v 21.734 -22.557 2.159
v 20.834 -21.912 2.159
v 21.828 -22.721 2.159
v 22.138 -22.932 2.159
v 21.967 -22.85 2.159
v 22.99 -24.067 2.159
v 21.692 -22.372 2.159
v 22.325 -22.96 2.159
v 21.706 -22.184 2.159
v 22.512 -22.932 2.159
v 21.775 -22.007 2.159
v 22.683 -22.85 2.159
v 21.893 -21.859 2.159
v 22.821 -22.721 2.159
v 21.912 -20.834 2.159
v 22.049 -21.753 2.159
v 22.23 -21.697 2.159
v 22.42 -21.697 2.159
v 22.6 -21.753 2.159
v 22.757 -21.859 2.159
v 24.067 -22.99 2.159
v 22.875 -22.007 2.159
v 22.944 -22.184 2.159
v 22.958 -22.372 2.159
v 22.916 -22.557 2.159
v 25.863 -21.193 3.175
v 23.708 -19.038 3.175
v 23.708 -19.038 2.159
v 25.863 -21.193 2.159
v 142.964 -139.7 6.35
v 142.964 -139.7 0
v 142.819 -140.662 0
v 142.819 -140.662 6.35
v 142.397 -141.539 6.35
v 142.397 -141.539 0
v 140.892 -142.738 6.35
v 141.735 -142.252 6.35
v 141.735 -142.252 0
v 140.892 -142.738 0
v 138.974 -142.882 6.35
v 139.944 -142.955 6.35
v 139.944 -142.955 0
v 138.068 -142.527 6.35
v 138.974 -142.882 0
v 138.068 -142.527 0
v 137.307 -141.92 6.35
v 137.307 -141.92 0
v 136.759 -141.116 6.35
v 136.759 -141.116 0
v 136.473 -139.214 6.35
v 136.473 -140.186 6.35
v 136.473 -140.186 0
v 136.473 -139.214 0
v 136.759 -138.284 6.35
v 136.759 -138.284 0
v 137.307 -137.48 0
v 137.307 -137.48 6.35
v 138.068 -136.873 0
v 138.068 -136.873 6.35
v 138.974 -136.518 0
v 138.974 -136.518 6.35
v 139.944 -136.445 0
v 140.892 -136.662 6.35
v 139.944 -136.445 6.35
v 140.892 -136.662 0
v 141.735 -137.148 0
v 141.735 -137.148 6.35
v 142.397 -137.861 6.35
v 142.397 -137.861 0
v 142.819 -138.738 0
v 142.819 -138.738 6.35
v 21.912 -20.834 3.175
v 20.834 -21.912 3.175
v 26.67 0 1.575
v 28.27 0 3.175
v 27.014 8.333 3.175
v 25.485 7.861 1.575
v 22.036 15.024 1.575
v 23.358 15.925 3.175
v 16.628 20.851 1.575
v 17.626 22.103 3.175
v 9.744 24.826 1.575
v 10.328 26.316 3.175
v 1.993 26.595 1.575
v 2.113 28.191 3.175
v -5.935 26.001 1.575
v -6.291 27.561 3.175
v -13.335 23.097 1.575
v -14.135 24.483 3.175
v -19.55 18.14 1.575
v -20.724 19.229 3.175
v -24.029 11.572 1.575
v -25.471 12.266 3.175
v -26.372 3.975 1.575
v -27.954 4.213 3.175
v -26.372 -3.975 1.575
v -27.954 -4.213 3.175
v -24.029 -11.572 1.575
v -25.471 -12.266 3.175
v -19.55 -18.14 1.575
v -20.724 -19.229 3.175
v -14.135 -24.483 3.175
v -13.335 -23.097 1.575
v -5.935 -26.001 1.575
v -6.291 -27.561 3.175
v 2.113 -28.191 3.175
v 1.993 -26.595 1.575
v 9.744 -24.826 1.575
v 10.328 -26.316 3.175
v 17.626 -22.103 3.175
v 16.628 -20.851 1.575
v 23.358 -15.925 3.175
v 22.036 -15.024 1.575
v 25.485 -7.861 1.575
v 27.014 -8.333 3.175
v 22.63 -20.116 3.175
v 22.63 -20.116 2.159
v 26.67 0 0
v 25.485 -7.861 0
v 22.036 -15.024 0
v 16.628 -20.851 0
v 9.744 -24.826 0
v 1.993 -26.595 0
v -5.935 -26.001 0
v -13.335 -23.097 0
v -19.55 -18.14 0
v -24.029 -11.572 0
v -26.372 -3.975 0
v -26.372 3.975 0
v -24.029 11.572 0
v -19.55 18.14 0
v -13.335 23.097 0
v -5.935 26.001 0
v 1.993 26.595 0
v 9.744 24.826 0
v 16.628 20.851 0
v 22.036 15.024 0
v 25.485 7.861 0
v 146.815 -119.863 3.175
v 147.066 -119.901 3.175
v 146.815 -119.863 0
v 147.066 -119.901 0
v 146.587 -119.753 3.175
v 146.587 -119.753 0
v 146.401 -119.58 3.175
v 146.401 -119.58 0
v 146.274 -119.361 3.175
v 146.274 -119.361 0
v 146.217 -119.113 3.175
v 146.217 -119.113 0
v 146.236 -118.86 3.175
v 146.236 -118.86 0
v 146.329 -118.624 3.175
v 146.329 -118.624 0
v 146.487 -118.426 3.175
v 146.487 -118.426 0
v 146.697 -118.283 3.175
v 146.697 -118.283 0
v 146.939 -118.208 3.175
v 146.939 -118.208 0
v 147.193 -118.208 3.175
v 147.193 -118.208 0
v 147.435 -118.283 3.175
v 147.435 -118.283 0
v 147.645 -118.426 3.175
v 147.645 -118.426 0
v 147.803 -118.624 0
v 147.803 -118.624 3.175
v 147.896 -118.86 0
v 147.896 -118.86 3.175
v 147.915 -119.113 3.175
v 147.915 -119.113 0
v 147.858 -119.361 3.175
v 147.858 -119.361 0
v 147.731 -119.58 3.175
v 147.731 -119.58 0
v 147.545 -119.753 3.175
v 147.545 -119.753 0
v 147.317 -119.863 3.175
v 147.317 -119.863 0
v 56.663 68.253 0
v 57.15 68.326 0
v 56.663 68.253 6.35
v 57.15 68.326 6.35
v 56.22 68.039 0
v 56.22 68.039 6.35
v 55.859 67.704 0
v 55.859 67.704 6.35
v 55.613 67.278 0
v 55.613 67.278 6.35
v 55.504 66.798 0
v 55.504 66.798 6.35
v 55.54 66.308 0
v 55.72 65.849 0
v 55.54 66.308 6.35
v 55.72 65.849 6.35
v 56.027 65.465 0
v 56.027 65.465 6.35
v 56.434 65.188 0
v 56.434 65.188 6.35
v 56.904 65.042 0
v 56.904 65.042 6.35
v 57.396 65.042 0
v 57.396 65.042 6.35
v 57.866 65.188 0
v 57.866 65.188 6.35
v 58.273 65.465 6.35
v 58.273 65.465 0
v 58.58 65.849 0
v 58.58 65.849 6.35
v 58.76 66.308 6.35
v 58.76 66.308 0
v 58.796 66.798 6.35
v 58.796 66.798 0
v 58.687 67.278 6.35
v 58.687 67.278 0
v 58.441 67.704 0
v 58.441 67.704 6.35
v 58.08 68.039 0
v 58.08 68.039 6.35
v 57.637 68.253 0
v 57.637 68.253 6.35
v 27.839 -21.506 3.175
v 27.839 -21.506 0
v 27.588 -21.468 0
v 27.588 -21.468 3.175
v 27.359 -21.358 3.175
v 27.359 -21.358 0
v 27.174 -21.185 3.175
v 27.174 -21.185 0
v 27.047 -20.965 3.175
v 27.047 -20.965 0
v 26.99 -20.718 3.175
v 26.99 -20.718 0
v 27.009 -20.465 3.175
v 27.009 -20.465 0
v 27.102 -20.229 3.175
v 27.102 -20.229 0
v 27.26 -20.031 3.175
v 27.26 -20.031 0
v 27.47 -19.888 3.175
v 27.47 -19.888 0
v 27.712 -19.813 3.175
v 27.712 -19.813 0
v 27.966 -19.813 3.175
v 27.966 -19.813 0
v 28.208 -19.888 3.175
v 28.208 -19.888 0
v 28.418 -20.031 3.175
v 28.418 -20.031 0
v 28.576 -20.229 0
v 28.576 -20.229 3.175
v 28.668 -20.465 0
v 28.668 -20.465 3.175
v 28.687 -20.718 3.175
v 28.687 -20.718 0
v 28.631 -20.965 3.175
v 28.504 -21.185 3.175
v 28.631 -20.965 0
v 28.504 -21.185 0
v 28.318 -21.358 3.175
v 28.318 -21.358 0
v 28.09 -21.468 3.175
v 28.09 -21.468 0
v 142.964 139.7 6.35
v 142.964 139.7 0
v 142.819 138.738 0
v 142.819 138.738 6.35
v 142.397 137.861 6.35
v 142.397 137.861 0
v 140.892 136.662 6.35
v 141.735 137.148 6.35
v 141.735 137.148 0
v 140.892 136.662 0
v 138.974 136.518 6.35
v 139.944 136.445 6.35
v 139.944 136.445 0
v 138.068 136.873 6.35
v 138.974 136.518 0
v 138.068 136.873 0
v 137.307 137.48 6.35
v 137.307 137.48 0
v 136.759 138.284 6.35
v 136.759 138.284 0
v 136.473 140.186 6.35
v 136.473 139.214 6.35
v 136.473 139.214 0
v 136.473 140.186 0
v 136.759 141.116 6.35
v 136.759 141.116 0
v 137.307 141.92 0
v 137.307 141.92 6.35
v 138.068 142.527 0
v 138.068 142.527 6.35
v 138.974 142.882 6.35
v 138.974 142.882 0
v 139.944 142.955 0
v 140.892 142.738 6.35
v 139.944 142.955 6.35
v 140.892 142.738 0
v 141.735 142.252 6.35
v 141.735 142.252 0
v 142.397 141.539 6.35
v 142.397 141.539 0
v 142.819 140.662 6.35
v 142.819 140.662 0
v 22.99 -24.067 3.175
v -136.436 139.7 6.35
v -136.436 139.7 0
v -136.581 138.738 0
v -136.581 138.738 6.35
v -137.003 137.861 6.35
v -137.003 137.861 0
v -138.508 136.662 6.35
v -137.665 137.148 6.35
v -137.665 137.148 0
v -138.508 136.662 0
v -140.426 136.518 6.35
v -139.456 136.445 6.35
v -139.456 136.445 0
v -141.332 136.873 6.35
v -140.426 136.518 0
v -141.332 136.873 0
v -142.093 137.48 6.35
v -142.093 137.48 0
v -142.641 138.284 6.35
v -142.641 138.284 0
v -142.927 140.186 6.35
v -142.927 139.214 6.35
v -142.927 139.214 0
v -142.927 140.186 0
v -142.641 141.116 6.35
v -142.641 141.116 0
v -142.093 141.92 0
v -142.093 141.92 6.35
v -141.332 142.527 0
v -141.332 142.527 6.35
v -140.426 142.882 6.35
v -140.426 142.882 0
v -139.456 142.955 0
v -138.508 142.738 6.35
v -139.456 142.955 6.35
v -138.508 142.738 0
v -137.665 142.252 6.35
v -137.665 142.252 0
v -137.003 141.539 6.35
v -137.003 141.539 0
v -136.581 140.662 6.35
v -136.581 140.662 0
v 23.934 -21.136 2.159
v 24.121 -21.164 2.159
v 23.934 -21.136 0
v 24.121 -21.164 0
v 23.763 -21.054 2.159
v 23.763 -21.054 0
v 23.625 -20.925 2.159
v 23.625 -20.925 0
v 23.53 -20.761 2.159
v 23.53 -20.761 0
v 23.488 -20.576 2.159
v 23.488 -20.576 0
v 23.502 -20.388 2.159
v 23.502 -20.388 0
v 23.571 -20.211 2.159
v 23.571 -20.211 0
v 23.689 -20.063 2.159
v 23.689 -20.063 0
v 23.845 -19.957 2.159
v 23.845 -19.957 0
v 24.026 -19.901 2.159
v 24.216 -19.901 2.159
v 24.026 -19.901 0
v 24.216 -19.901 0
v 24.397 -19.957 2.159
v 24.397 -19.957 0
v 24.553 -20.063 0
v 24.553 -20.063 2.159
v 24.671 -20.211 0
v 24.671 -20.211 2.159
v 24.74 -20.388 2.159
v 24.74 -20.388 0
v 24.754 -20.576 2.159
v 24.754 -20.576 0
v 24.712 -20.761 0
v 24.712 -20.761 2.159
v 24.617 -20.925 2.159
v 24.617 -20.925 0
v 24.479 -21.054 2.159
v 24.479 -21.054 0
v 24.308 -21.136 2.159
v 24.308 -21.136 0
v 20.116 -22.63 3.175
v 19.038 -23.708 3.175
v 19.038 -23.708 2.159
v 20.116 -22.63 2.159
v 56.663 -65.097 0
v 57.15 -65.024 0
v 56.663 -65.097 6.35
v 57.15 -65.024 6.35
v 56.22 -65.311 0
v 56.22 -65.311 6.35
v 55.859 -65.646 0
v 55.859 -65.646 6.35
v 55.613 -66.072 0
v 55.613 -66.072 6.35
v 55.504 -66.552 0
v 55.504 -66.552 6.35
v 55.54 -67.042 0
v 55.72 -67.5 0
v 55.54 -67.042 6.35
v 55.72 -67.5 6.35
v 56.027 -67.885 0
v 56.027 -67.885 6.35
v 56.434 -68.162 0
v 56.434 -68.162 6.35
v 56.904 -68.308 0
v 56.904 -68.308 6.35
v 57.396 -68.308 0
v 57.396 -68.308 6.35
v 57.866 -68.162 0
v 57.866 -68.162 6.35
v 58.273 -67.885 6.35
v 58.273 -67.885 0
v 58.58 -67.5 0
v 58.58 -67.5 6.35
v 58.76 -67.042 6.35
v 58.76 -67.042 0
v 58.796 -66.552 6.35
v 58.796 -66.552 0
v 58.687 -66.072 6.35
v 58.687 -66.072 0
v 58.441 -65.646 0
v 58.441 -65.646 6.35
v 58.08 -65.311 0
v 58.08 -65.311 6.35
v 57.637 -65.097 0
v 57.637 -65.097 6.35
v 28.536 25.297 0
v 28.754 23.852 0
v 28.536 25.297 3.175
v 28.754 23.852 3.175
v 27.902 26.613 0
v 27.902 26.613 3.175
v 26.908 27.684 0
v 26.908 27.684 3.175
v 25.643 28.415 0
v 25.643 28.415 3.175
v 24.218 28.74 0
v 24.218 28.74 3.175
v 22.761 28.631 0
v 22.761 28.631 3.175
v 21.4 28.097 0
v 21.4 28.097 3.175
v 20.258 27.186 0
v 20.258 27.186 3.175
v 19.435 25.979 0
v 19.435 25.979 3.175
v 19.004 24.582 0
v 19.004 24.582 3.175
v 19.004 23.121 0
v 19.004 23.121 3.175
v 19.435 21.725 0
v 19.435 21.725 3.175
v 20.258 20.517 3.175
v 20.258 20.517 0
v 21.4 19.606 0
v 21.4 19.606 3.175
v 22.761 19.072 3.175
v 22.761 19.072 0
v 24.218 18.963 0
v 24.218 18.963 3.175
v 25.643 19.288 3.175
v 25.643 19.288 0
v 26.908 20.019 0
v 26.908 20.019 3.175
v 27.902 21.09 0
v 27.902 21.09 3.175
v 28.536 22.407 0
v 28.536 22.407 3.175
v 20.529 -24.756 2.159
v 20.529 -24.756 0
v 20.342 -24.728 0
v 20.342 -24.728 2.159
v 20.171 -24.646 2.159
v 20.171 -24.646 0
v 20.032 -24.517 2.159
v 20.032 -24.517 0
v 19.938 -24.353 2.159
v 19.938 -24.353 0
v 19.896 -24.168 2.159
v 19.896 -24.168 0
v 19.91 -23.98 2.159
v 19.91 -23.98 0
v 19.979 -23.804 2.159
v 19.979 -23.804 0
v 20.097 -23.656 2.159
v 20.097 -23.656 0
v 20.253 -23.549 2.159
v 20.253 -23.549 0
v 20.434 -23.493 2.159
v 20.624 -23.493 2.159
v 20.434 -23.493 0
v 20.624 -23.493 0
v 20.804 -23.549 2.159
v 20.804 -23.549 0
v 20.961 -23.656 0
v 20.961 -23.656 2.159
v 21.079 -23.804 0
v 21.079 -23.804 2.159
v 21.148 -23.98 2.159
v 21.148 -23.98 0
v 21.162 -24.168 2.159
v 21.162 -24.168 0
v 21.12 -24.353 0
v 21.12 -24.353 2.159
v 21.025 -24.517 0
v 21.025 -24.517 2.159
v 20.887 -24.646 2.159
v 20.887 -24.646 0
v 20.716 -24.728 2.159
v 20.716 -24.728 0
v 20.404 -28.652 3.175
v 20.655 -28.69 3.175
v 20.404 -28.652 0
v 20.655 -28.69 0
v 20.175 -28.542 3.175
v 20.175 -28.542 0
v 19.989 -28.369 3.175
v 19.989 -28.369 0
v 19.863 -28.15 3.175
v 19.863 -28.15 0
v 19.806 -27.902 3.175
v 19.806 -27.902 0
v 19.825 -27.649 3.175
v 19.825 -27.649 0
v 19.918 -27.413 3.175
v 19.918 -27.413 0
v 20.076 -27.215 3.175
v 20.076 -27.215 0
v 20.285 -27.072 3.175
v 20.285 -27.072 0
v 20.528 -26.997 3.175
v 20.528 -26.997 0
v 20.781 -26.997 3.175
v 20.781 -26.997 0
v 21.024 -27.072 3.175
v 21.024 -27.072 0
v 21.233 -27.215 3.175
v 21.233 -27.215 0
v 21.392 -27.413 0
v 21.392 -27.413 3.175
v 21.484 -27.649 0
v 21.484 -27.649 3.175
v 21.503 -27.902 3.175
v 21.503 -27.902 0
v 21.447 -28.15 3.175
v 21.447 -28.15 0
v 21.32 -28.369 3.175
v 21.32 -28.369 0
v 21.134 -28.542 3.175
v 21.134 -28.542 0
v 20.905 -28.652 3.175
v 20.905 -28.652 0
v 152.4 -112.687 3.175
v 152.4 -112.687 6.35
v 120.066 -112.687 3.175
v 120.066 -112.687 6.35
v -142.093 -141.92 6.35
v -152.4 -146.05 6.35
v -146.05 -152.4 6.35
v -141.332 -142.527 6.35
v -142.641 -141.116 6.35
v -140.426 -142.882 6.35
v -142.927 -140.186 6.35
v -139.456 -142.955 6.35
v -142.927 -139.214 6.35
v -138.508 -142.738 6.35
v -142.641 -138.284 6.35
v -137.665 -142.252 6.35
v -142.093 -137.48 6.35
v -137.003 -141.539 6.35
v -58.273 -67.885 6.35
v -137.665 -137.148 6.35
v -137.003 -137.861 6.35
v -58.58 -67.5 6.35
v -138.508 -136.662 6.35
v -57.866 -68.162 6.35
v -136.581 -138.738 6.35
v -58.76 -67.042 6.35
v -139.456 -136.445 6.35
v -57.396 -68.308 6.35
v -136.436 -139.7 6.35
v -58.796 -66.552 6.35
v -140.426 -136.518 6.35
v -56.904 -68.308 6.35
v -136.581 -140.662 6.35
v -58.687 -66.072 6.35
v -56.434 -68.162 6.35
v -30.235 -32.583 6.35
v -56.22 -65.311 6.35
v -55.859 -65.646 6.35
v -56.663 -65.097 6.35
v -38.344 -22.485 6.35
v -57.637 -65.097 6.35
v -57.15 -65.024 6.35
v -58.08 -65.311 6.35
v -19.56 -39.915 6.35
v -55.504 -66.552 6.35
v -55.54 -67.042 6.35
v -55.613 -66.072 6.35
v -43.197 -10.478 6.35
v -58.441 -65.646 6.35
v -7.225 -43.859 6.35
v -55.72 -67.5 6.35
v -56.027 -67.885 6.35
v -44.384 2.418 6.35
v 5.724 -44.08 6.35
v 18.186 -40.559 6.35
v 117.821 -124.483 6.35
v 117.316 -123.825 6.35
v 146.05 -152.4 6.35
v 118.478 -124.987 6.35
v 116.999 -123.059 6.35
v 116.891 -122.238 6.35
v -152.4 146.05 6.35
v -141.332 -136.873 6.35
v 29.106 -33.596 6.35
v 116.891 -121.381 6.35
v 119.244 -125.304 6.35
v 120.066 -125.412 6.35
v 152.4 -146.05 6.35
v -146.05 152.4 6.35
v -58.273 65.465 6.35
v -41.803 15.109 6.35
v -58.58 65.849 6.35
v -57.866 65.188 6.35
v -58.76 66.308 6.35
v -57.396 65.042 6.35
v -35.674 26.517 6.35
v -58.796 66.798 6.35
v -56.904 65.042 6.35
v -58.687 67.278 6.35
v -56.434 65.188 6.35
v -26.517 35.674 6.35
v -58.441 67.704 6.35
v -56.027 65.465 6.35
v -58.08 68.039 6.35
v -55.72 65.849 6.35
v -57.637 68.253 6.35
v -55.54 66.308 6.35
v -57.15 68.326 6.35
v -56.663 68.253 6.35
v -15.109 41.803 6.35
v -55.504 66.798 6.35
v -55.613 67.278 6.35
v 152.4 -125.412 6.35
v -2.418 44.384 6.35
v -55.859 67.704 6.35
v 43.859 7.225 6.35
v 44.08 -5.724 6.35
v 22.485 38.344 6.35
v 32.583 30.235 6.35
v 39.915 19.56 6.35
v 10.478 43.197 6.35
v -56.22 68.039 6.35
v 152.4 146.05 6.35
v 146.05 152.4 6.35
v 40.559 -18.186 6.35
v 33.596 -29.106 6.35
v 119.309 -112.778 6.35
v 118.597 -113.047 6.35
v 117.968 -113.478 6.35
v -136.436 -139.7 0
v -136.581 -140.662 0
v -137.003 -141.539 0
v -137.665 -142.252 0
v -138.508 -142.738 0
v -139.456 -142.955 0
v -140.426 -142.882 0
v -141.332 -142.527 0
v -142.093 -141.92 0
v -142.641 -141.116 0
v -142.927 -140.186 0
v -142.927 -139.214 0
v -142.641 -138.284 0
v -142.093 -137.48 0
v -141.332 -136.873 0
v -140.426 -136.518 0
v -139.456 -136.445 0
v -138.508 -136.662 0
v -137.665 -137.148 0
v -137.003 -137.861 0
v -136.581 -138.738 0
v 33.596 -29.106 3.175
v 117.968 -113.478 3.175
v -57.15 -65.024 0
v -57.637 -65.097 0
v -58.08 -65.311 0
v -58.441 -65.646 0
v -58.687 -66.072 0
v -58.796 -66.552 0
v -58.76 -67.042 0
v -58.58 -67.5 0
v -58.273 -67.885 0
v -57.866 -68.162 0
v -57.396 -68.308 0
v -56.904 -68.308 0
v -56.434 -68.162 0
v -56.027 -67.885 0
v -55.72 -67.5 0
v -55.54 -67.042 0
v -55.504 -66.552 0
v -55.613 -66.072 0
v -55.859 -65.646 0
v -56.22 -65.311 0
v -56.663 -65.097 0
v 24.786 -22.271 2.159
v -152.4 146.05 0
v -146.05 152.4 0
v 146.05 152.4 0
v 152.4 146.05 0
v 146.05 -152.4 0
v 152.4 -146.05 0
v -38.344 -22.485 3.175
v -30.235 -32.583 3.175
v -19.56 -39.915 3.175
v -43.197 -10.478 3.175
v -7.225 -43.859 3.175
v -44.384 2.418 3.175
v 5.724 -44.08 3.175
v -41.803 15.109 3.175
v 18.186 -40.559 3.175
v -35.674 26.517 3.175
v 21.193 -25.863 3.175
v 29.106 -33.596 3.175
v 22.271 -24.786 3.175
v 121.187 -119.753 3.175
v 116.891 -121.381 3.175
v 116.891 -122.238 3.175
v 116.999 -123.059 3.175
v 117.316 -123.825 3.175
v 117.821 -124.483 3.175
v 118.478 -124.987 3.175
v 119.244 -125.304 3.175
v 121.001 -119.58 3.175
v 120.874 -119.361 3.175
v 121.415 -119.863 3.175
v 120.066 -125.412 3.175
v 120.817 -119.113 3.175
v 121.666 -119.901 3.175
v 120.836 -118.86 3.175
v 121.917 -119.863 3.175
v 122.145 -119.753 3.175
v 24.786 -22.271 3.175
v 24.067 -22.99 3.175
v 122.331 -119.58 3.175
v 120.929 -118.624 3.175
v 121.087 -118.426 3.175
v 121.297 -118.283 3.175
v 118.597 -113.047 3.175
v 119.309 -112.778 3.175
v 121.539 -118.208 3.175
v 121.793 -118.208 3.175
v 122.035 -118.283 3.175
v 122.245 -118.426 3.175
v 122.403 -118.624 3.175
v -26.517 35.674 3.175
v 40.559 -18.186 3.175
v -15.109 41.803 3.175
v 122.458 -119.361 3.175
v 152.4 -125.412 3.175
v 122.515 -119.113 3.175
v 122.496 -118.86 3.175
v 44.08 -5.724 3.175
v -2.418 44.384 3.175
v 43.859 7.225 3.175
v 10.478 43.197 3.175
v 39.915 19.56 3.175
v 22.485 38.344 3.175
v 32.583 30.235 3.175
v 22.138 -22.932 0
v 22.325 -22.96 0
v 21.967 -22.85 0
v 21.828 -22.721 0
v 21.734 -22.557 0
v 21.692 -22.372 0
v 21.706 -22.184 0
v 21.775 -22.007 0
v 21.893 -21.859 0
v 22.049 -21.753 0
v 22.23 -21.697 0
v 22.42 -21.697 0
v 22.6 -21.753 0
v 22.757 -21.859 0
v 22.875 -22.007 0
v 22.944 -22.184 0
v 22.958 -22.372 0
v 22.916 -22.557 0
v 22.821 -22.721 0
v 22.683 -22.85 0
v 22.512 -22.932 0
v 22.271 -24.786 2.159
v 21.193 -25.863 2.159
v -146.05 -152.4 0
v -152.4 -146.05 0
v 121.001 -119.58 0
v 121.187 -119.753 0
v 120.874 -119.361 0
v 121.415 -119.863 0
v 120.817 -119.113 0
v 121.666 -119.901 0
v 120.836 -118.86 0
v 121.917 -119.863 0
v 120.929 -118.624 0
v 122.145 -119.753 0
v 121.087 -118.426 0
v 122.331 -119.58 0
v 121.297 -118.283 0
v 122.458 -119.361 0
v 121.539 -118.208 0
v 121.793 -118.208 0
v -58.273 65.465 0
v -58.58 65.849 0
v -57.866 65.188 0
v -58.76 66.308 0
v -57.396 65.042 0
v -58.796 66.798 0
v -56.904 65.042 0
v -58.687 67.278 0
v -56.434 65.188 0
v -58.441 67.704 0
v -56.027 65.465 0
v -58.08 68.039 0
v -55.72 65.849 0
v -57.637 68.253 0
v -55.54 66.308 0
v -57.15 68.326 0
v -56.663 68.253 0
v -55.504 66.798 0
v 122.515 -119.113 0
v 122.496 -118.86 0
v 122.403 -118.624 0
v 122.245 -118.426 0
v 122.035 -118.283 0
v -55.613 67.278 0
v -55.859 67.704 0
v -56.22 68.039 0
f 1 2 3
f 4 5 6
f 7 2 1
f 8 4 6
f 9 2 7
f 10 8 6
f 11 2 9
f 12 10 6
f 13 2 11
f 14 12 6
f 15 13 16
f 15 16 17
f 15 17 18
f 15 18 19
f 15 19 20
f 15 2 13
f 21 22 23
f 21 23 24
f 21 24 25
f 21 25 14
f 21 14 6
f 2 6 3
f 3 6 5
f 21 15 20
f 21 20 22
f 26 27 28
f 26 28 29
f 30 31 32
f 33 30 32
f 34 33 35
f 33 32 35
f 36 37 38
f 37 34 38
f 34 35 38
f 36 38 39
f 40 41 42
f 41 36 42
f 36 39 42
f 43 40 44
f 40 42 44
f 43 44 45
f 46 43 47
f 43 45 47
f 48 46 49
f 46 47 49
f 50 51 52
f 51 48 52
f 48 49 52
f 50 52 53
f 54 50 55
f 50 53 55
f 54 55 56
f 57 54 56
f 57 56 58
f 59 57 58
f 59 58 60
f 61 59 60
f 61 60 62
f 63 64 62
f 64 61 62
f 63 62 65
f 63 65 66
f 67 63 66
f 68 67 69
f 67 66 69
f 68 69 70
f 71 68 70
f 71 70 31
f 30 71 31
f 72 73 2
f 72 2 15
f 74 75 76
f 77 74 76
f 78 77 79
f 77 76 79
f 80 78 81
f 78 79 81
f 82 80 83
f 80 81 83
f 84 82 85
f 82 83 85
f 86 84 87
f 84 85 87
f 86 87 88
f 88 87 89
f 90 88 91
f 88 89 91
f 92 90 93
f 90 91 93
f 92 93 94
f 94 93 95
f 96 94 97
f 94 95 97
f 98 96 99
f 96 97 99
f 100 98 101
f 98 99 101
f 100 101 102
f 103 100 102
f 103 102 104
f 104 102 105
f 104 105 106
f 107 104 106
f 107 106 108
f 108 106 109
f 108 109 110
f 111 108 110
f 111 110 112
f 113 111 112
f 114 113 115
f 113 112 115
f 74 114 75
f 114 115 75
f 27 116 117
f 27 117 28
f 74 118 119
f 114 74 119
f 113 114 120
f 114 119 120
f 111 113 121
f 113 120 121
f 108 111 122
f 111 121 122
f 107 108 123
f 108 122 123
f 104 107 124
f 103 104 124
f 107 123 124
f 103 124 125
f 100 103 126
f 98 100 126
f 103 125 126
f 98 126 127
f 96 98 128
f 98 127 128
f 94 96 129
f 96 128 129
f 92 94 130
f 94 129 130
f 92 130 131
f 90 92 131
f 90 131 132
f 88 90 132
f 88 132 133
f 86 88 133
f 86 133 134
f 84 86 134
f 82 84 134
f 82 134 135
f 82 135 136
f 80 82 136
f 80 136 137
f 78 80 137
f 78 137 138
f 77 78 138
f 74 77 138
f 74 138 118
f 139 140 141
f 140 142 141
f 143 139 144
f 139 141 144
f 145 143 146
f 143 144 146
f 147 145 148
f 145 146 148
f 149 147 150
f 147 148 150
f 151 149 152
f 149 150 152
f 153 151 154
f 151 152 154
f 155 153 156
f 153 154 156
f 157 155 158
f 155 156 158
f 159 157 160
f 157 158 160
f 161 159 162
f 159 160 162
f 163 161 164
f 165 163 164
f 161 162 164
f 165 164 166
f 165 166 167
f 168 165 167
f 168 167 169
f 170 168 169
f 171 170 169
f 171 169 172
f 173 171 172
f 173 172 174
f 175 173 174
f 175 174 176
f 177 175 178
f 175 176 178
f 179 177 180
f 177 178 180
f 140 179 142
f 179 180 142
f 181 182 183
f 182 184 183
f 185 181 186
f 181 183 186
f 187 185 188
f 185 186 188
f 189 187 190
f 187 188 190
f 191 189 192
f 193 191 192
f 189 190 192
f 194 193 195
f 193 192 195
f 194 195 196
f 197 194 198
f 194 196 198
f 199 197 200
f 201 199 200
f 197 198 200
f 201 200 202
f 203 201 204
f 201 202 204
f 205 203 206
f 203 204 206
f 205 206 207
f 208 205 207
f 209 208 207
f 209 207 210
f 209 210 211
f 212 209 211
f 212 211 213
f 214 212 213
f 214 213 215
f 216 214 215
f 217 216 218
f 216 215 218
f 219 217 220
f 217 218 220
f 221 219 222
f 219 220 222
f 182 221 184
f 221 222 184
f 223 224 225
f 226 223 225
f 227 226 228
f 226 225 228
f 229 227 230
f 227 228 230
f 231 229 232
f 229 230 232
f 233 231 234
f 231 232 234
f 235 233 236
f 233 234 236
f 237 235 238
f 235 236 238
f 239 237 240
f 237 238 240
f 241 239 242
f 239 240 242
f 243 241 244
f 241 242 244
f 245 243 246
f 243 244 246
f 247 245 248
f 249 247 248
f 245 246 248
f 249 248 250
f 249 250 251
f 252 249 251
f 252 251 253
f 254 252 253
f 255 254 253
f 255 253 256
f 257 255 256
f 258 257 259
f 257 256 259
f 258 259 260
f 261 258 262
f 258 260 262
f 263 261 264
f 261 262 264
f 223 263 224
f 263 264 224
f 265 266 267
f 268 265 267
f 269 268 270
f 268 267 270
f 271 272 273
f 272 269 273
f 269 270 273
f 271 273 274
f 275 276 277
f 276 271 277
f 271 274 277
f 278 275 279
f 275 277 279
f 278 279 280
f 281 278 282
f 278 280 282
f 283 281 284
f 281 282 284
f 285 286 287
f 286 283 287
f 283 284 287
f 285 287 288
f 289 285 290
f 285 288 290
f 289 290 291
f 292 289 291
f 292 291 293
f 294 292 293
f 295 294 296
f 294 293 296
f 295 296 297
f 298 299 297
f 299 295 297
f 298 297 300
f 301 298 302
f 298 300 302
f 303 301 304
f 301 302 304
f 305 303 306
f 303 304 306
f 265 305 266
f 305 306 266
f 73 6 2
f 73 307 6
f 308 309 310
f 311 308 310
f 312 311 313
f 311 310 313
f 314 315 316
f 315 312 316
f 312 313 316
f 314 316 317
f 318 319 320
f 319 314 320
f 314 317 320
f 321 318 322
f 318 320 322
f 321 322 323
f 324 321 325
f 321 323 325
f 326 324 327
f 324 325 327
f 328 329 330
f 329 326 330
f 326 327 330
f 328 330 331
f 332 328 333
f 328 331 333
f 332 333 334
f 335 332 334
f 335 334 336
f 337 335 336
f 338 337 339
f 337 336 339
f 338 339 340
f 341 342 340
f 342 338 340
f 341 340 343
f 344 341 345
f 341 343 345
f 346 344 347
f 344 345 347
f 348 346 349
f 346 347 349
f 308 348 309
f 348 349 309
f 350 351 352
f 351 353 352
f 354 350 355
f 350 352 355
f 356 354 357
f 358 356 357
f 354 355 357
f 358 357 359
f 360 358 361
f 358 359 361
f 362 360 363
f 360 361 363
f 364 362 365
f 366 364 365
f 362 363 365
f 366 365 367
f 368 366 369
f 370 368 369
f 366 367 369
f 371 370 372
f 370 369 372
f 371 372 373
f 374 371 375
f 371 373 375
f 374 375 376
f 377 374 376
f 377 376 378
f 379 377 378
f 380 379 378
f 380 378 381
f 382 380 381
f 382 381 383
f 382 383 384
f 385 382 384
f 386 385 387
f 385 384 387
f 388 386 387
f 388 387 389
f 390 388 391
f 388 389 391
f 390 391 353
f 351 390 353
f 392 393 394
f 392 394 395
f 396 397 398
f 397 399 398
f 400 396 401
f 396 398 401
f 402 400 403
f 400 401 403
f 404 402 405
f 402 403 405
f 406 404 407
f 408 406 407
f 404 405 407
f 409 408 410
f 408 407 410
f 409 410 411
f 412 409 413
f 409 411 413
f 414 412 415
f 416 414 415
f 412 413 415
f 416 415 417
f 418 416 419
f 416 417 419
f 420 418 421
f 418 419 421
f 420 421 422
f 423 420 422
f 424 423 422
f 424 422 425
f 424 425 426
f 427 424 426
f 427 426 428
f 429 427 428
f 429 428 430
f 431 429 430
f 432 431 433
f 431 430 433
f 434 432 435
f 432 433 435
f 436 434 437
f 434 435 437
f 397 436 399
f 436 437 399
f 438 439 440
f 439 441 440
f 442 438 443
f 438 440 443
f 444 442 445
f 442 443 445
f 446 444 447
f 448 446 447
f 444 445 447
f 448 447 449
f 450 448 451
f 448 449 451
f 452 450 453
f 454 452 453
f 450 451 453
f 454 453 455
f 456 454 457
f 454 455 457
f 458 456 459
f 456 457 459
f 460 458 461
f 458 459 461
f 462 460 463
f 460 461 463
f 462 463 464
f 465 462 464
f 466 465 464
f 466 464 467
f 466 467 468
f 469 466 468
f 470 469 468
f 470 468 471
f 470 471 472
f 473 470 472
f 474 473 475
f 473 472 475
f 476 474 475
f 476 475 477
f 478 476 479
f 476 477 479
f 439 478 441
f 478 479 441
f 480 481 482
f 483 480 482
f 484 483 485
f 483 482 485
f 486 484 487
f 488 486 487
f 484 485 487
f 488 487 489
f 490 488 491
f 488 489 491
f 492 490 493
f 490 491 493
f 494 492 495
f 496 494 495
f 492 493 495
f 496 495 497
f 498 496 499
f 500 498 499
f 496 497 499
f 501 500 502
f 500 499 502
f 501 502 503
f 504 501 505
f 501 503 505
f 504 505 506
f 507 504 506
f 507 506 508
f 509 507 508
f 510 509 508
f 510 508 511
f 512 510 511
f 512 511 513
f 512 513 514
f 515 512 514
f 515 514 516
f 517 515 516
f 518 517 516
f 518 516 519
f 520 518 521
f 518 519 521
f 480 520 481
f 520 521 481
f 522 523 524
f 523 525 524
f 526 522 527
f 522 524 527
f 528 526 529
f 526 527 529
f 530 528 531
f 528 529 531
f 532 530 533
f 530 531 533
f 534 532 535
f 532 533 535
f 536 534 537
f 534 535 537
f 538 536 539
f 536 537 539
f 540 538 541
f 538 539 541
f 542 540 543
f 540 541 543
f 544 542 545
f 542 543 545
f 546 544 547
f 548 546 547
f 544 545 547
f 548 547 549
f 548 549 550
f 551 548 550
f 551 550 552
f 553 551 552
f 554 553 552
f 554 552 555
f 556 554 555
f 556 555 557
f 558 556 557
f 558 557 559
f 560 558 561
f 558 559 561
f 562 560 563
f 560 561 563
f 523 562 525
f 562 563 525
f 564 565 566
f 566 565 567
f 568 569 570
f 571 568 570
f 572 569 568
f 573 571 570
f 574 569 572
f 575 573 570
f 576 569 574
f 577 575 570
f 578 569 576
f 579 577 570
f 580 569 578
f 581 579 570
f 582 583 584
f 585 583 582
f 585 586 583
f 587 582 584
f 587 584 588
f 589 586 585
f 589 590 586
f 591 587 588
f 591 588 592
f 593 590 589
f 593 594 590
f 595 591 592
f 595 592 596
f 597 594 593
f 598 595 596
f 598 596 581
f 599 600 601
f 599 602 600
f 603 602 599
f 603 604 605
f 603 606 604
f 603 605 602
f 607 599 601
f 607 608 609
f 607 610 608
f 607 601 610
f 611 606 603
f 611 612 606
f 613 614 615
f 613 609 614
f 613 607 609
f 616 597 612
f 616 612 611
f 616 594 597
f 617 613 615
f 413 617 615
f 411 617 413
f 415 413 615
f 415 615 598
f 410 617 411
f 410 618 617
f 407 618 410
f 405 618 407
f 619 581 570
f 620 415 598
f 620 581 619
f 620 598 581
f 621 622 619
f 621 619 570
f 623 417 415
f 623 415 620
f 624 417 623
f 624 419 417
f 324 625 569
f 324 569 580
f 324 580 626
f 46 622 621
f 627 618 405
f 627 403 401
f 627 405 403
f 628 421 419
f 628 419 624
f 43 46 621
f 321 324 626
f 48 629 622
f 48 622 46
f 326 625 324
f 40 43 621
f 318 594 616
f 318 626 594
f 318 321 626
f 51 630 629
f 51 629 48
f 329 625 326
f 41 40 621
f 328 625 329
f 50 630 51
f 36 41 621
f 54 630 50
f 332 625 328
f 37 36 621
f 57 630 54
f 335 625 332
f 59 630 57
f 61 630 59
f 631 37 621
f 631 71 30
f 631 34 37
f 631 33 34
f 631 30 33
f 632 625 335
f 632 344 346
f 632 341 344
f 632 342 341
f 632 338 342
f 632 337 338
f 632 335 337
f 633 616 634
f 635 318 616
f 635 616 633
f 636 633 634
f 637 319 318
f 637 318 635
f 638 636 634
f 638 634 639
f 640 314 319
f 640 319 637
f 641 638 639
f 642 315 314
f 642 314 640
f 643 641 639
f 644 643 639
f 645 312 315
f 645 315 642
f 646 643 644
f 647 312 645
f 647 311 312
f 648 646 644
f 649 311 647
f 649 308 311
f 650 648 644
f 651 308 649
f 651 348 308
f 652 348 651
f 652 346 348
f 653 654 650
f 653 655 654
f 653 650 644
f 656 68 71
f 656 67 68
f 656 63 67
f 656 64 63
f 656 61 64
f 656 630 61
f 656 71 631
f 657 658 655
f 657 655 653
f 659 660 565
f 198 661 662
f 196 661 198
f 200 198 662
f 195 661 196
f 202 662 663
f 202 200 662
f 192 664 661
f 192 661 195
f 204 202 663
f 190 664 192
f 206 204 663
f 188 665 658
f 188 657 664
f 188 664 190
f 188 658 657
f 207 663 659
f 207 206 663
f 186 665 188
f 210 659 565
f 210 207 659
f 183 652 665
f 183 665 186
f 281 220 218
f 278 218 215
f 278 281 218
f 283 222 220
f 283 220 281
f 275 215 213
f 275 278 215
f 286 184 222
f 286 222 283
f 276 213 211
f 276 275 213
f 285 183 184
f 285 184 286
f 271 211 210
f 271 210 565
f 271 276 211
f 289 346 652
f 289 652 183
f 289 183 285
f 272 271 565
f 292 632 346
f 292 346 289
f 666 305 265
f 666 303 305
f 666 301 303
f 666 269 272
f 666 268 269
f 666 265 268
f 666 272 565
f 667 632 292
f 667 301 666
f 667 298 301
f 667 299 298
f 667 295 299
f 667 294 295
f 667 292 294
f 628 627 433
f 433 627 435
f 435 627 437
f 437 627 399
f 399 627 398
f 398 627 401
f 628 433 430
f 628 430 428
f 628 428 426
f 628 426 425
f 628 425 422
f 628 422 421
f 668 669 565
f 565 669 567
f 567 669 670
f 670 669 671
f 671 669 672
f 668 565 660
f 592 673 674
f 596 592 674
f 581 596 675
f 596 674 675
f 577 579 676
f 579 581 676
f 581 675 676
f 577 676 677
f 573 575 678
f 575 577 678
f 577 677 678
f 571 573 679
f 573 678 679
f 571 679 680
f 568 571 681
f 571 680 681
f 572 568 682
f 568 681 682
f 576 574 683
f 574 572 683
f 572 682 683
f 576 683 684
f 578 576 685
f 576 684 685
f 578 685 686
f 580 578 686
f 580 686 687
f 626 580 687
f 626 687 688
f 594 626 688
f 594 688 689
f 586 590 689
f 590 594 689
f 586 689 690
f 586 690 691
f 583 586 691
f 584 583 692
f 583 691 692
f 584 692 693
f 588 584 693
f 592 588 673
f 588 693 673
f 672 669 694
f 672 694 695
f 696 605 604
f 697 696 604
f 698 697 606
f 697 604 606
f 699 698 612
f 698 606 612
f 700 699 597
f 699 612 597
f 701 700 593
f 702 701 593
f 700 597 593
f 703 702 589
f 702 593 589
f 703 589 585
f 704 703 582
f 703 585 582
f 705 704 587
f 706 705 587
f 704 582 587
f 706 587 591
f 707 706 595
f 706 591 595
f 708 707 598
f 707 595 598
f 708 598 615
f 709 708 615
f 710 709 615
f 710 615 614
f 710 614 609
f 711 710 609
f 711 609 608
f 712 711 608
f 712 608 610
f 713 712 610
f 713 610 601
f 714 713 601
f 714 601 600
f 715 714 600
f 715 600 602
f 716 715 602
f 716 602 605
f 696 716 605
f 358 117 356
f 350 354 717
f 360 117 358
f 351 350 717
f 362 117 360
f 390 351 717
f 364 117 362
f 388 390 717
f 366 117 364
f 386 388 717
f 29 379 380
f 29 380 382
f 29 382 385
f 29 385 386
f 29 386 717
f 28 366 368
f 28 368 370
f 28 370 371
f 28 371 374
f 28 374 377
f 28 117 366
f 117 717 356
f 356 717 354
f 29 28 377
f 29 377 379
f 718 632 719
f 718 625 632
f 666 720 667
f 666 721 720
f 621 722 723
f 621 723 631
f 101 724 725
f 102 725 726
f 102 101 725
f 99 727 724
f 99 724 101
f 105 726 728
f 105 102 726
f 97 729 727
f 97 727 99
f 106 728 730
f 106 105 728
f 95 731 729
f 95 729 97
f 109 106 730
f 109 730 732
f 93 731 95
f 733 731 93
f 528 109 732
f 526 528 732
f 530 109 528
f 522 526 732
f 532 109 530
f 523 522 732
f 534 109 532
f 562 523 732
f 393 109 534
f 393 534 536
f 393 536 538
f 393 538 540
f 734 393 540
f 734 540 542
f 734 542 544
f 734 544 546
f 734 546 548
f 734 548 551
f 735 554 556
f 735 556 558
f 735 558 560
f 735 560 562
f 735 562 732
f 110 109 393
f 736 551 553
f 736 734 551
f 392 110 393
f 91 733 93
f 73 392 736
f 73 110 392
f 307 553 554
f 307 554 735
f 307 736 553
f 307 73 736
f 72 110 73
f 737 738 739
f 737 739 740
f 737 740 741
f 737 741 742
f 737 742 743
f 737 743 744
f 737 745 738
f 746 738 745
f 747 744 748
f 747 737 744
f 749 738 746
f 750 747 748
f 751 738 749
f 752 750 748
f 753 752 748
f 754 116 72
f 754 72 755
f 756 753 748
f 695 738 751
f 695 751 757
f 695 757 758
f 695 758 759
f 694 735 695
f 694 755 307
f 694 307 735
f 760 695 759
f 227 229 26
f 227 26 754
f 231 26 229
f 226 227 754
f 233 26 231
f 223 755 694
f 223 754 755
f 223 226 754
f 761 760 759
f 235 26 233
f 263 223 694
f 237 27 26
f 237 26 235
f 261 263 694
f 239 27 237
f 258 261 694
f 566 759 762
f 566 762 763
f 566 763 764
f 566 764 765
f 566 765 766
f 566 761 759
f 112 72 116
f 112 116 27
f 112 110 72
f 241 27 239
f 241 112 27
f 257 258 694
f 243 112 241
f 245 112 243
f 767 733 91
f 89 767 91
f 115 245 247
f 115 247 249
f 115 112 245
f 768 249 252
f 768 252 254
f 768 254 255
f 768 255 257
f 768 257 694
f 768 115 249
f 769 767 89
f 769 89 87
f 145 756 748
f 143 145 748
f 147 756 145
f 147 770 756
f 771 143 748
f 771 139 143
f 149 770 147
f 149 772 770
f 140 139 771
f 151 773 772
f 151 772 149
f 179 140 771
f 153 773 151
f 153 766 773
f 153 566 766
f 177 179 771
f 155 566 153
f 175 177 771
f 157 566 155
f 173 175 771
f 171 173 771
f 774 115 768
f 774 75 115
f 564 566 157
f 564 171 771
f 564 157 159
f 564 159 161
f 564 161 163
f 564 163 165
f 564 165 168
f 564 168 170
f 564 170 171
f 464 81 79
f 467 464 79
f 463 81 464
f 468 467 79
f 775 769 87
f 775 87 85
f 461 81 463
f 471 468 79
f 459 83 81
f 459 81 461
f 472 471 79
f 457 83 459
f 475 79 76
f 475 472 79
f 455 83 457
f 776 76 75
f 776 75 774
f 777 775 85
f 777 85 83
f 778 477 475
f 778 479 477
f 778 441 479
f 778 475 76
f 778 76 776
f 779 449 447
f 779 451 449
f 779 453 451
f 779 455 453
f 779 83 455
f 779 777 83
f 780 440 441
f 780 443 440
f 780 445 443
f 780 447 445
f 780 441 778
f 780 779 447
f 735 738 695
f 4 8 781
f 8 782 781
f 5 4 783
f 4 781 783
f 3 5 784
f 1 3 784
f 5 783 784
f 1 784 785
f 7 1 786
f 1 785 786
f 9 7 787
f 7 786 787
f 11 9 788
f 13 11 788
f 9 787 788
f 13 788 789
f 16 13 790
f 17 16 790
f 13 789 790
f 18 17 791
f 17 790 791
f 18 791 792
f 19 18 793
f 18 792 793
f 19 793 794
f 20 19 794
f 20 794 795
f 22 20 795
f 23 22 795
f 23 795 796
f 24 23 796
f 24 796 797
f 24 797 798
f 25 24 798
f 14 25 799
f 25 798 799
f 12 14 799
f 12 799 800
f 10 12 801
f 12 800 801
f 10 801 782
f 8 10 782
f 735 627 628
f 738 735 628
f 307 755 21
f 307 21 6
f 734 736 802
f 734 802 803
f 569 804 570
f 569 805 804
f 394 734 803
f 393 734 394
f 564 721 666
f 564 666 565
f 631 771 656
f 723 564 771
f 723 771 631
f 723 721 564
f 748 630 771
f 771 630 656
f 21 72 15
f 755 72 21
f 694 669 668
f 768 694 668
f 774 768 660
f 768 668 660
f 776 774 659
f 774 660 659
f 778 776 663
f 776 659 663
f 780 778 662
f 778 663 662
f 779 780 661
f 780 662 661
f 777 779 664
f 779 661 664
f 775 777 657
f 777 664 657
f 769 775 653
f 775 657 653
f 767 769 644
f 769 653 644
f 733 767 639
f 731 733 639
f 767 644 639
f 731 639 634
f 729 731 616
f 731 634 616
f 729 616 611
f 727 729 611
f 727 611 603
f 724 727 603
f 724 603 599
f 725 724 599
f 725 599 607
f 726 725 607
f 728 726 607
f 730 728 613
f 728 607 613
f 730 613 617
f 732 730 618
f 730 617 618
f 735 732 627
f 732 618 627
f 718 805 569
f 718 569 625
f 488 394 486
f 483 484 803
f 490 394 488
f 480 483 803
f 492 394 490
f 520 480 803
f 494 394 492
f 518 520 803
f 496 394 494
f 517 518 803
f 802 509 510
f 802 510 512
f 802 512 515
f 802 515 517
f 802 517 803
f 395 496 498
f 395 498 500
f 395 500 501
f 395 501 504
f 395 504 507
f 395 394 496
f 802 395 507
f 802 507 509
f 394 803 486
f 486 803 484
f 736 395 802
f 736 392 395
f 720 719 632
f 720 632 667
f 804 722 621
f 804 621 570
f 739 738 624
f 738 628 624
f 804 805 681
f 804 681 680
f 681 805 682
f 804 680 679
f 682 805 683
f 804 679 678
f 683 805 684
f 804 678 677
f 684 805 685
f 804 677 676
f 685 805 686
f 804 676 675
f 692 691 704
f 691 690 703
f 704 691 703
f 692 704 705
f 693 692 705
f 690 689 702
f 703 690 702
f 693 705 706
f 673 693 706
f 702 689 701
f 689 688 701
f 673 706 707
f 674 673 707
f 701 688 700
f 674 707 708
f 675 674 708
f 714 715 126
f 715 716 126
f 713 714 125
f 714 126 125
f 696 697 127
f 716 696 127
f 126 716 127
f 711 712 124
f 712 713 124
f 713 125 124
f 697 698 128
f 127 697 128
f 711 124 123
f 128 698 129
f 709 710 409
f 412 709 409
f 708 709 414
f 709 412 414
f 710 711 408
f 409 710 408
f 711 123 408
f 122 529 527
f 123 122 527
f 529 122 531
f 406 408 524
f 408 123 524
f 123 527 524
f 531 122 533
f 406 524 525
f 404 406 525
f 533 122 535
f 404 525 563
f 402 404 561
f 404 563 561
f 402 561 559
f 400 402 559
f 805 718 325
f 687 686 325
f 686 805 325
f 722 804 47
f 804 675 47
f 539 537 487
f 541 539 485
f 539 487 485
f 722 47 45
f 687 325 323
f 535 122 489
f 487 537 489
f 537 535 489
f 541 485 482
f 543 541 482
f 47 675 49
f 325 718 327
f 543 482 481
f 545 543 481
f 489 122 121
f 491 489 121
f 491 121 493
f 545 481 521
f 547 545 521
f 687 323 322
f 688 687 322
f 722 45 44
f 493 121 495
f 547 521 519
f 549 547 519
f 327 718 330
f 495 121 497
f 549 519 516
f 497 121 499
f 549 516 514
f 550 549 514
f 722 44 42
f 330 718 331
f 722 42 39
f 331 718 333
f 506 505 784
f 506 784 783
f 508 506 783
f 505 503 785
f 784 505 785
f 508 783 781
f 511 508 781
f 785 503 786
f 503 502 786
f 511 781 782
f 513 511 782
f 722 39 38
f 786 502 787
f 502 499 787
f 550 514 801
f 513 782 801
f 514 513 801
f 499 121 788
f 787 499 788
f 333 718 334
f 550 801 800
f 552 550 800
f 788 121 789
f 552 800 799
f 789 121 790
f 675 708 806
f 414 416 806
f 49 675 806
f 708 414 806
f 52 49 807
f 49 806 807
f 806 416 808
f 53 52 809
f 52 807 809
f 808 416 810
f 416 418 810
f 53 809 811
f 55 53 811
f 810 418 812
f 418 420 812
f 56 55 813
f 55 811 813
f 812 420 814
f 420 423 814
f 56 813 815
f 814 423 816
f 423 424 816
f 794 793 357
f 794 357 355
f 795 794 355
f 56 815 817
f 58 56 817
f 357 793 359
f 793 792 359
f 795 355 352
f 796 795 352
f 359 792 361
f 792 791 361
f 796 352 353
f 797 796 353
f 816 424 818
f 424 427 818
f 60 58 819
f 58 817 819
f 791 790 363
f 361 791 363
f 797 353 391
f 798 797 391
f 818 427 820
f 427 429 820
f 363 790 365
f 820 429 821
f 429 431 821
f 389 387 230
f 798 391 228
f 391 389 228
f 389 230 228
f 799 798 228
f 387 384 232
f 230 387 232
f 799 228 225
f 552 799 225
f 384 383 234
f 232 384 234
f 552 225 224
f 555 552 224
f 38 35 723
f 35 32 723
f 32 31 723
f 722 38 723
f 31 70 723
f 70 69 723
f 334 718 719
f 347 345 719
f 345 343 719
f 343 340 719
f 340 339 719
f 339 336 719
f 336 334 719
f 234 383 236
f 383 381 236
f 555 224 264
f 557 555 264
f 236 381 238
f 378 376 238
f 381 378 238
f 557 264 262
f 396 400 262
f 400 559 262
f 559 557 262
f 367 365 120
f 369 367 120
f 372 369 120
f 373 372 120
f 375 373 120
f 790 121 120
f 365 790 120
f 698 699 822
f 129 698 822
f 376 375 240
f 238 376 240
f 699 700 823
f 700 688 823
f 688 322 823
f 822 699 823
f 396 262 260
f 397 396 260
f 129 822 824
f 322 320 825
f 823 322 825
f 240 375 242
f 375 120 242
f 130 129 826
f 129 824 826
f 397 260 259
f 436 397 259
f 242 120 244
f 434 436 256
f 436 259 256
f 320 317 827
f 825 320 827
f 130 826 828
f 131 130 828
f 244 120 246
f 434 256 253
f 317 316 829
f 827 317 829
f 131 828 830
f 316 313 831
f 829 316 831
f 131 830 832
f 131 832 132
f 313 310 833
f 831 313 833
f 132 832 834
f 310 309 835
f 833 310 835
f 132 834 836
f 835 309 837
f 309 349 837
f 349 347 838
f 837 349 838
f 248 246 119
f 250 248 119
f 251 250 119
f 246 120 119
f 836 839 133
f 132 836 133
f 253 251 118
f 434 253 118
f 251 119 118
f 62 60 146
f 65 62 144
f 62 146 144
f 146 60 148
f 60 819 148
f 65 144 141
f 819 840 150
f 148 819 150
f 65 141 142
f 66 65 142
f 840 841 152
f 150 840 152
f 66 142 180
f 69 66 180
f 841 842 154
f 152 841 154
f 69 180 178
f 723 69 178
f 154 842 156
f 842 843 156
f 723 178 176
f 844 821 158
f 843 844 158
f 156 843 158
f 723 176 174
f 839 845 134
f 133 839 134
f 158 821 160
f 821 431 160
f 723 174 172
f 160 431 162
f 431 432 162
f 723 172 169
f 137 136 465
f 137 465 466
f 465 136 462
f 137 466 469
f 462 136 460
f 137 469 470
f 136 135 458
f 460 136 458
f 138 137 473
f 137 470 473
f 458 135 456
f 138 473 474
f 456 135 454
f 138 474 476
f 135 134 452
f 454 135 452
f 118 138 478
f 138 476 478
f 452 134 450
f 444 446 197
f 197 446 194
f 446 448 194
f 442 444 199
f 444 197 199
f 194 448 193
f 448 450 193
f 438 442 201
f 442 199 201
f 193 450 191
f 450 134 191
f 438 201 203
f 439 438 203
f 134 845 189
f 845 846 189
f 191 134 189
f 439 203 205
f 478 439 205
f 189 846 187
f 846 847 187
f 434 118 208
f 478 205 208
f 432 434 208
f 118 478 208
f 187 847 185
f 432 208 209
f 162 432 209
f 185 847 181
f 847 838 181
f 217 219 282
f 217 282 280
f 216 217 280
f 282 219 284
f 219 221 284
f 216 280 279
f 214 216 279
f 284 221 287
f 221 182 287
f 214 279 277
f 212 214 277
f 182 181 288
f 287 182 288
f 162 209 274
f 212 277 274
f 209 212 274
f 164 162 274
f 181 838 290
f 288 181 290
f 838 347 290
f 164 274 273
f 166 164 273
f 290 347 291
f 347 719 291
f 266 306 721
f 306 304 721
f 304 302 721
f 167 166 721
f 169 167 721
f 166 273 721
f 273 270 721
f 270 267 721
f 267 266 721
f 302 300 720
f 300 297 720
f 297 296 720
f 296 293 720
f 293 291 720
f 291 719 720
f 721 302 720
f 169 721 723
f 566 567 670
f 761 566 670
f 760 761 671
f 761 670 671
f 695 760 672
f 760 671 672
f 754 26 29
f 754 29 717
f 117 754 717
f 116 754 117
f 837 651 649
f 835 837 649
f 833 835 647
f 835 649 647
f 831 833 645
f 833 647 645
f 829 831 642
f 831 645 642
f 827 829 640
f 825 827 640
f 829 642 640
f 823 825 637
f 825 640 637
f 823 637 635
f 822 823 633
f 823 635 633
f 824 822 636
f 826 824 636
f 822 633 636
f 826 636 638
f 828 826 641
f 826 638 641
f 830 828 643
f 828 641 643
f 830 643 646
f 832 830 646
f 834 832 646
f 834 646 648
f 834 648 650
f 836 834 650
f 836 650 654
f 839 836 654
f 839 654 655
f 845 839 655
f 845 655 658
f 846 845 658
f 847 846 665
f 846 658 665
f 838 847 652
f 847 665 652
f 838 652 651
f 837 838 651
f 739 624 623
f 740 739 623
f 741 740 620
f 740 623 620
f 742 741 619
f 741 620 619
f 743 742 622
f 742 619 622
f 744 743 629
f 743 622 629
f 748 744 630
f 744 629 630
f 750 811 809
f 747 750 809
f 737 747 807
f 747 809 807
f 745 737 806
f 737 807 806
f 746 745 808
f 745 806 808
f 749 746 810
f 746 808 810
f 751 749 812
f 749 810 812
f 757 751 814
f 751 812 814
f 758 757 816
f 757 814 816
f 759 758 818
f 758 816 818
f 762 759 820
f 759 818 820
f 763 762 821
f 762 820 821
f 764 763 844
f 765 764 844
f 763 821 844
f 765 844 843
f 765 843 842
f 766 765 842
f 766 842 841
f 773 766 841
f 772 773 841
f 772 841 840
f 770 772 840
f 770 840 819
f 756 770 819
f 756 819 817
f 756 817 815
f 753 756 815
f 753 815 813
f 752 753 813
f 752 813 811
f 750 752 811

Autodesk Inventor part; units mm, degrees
ref_plane "YZ Plane" through (0, 0, 0) normal (1, 0, 0) x (0, 1, 0)
ref_plane "XZ Plane" through (0, 0, 0) normal (0, 1, 0) x (-1, 0, 0)
ref_plane "XY Plane" through (0, 0, 0) normal (0, 0, 1) x (1, 0, 0)
sketch "Sketch1" plane through (0, 0, 0) normal (0, 0, 1) x (1, 0, 0)
  line L0 (-152.4, 152.4) -> (152.4, 152.4)
  line L1 (152.4, 152.4) -> (152.4, -152.4)
  line L2 (152.4, -152.4) -> (-152.4, -152.4)
  line L3 (-152.4, -152.4) -> (-152.4, 152.4)
  circle A0 centre (0, 0) radius 26.67
  circle A1 centre (-139.7, 139.7) radius 3.2639
  circle A2 centre (139.7, 139.7) radius 3.2639
  circle A3 centre (139.7, -139.7) radius 3.2639
  circle A4 centre (-139.7, -139.7) radius 3.2639
  point P0 (0, 152.4)
  point P1 (-152.4, 0)
  dimension "d0" = 53.34
  dimension "d1" = 304.8
  dimension "d2" = 304.8
  dimension "d3" = 6.5278
  dimension "d4" = 6.5278
  dimension "d5" = 6.5278
  dimension "d6" = 6.5278
  dimension "d7" = 279.4
  dimension "d8" = 139.7
  dimension "d9" = 279.4
  dimension "d10" = 139.7
extrude "Extrusion1" add sketch "Sketch1" along normal blind 6.35
chamfer "Chamfer1" distance 6.35 angle 45 4 edges at (152.4, 152.4, 3.175) (152.4, -152.4, 3.175) (-152.4, 152.4, 3.175) (-152.4, -152.4, 3.175)
sketch "Sketch10" plane through (0, 0, 6.35) normal (0, 0, 1) x (1, 0, 0)
  line L0 (-213.36, 0) -> (213.36, 0) construction
  line L1 (0, -213.36) -> (0, 213.36) construction
  line L2 (-81.3558, 81.3558) -> (81.3558, -81.3558) construction
  line L3 (15.2664, -26.0427) -> (26.0427, -15.2664) construction
  line L4 (26.0427, -15.2664) -> (33.2269, -22.4506) construction
  line L5 (27.8388, -27.8388) -> (22.4506, -33.2269) construction
  line L6 (22.4506, -33.2269) -> (15.2664, -26.0427) construction
  circle A0 centre (0, 0) radius 26.67 projected
  line L7 (18.8585, -29.6348) -> (29.6348, -18.8585) construction
  line L8 (152.4, 146.05) -> (152.4, -146.05) projected
  line L9 (152.4, -112.6871) -> (120.0658, -112.6871)
  line L10 (116.8908, -115.8621) -> (116.8908, -122.2375)
  line L11 (120.0658, -125.4125) -> (152.4, -125.4125)
  line L12 (152.4, -125.4125) -> (152.4, -112.6871)
  arc A1 (120.0658, -112.6871) -> (116.8908, -115.8621) centre (120.0658, -115.8621) ccw
  arc A2 (116.8908, -122.2375) -> (120.0658, -125.4125) centre (120.0658, -122.2375) ccw
  line L13 (146.05, -152.4) -> (-146.05, -152.4) projected
  line L14 (118.491, -123.8123) -> (150.241, -123.8123) construction
  line L15 (150.241, -123.8123) -> (150.241, -114.2873) construction
  line L16 (150.241, -114.2873) -> (118.491, -114.2873) construction
  line L17 (118.491, -114.2873) -> (118.491, -123.8123) construction
  line L18 (134.366, -114.2873) -> (134.366, -123.8123) construction
  line L19 (118.491, -119.0498) -> (150.241, -119.0498) construction
  arc A3 (33.5957, -29.1055) -> (29.1055, -33.5957) centre (0, 0) ccw
  line L20 (29.1055, -33.5957) -> (116.8908, -121.3809)
  line L21 (33.5957, -29.1055) -> (117.9685, -113.4784)
  line L22 (21.9118, -20.8342) -> (24.0671, -22.9895)
  line L23 (24.0671, -22.9895) -> (22.9895, -24.0671)
  line L24 (22.9895, -24.0671) -> (20.8342, -21.9118)
  line L25 (20.8342, -21.9118) -> (21.9118, -20.8342)
  line L26 (21.373, -21.373) -> (23.5283, -23.5283) construction
  line L27 (20.1158, -22.6302) -> (22.271, -24.7855)
  line L28 (19.0381, -23.7079) -> (20.1158, -22.6302)
  line L29 (21.1934, -25.8631) -> (19.0381, -23.7079)
  line L30 (22.271, -24.7855) -> (21.1934, -25.8631)
  line L31 (22.6302, -20.1158) -> (23.7079, -19.0381)
  line L32 (24.7855, -22.271) -> (22.6302, -20.1158)
  line L33 (23.7079, -19.0381) -> (25.8631, -21.1934)
  line L34 (25.8631, -21.1934) -> (24.7855, -22.271)
  point P0 (22.3249, -22.3249)
  point P1 (20.6546, -27.8388)
  point P2 (27.8388, -20.6546)
  point P3 (121.666, -119.0498)
  point P4 (147.066, -119.0498)
  point P5 (20.5289, -24.121)
  point P6 (24.121, -20.5289)
  point P7 (19.577, -23.1691)
  point P8 (21.7322, -25.3243)
  point P9 (23.1691, -19.577)
  point P10 (25.3243, -21.7322)
  dimension "d84" = 45
  dimension "d85" = 10.16
  dimension "d86" = 15.24
  dimension "d87" = 39.37
  dimension "d90" = 2.3622
  dimension "d91" = 10.16
  dimension "d101" = 3.175
  dimension "d120" = 31.75
  dimension "d121" = 9.525
  dimension "d122" = 25.4
  dimension "d124" = 33.3502
  dimension "d125" = 1.6002
  dimension "d126" = 1.6002
  dimension "d128" = 2.159
  dimension "d156" = 88.9
  dimension "d159" = 6.35
  dimension "d163" = 2.3622
  dimension "d164" = 2.3622
  dimension "d165" = 2.54
  dimension "d166" = 2.54
  dimension "d167" = 3.048
  dimension "d168" = 1.524
  dimension "d172" = 2.54
  dimension "d179" = 2.54
  dimension "d185" = 1.016
hole "Hole8" at (22.3249, -22.3249, 6.35) at (20.5289, -24.121, 6.35) at (24.121, -20.5289, 6.35) direction (0, 0, -1) diameter 1.27 end through all
hole "Hole9" at (20.6546, -27.8388, 6.35) at (27.8388, -20.6546, 6.35) at (121.666, -119.0498, 6.35) at (147.066, -119.0498, 6.35) direction (0, 0, -1) diameter 1.7018 end through all
extrude "Extrusion5" cut sketch "Sketch10" against normal blind 3.175 contours A0 | L8 L11 A2 L10 A1 L9 | A1 L10 L20 A3 L21 | L22 L23 L24 L25 | L27 L30 L29 L28 | L31 L33 L34 L32
sketch "Sketch11" plane through (0, 0, 6.35) normal (0, 0, 1) x (1, 0, 0)
  line L0 (-213.36, 0) -> (213.36, 0) construction
  line L1 (0, -213.36) -> (0, 213.36) construction
  line L2 (-84.555, -84.555) -> (84.555, 84.555) construction
  circle A0 centre (22.4506, 22.4506) radius 1.9812 construction
  circle A1 centre (26.0427, 26.0427) radius 0.8509 construction
  circle A2 centre (23.8516, 23.8516) radius 4.9022
  point P0 (0, 0)
  dimension "d130" = 45
  dimension "d135" = 3.9624
  dimension "d136" = 1.7018
  dimension "d142" = 31.75
  dimension "d143" = 5.08
  dimension "d157" = 9.8044
  dimension "d158" = 33.7312
extrude "Extrusion6" cut sketch "Sketch11" against normal through all
sketch "Sketch12" plane through (0, 0, 0) normal (0, 0, -1) x (-1, 0, 0)
  line L0 (-57.15, 66.675) -> (57.15, 66.675) construction
  line L1 (57.15, 66.675) -> (57.15, -66.675) construction
  line L2 (57.15, -66.675) -> (-57.15, -66.675) construction
  line L3 (-57.15, -66.675) -> (-57.15, 66.675) construction
  line L4 (-57.15, 66.675) -> (57.15, -66.675) construction
  point P0 (0, 0)
  point P1 (0, 0)
  dimension "d147" = 133.35
  dimension "d148" = 114.3
hole "Hole10" at (-57.15, 66.675, 0) at (-57.15, -66.675, 0) at (57.15, -66.675, 0) at (57.15, 66.675, 0) direction (0, 0, 1) diameter 3.302 end through all thread size "8-32 UNC" class "2B" standard "ANSI Unified Screw Threads"
chamfer "Chamfer2" distance 1.6002 angle 45 1 edges at (-26.67, 0, 3.175)
extrude "Extrusion7" cut sketch "Sketch10" against normal blind 4.191 contours L22 L23 L24 L25 | L27 L30 L29 L28 | L31 L33 L34 L32
equation "\"d4\" = d3"
equation "\"d5\" = d3"
equation "\"d6\" = d3"
equation "\"d8\" = 0.5 * d7"
equation "\"d10\" = 0.5 * d9"
equation "\"d126\" = d125"
equation "\"d163\" = d90"
equation "\"d164\" = d90"
equation "\"d166\" = d165"
properties part number "J002949" material "ALUMINUM, 6061-T651"
